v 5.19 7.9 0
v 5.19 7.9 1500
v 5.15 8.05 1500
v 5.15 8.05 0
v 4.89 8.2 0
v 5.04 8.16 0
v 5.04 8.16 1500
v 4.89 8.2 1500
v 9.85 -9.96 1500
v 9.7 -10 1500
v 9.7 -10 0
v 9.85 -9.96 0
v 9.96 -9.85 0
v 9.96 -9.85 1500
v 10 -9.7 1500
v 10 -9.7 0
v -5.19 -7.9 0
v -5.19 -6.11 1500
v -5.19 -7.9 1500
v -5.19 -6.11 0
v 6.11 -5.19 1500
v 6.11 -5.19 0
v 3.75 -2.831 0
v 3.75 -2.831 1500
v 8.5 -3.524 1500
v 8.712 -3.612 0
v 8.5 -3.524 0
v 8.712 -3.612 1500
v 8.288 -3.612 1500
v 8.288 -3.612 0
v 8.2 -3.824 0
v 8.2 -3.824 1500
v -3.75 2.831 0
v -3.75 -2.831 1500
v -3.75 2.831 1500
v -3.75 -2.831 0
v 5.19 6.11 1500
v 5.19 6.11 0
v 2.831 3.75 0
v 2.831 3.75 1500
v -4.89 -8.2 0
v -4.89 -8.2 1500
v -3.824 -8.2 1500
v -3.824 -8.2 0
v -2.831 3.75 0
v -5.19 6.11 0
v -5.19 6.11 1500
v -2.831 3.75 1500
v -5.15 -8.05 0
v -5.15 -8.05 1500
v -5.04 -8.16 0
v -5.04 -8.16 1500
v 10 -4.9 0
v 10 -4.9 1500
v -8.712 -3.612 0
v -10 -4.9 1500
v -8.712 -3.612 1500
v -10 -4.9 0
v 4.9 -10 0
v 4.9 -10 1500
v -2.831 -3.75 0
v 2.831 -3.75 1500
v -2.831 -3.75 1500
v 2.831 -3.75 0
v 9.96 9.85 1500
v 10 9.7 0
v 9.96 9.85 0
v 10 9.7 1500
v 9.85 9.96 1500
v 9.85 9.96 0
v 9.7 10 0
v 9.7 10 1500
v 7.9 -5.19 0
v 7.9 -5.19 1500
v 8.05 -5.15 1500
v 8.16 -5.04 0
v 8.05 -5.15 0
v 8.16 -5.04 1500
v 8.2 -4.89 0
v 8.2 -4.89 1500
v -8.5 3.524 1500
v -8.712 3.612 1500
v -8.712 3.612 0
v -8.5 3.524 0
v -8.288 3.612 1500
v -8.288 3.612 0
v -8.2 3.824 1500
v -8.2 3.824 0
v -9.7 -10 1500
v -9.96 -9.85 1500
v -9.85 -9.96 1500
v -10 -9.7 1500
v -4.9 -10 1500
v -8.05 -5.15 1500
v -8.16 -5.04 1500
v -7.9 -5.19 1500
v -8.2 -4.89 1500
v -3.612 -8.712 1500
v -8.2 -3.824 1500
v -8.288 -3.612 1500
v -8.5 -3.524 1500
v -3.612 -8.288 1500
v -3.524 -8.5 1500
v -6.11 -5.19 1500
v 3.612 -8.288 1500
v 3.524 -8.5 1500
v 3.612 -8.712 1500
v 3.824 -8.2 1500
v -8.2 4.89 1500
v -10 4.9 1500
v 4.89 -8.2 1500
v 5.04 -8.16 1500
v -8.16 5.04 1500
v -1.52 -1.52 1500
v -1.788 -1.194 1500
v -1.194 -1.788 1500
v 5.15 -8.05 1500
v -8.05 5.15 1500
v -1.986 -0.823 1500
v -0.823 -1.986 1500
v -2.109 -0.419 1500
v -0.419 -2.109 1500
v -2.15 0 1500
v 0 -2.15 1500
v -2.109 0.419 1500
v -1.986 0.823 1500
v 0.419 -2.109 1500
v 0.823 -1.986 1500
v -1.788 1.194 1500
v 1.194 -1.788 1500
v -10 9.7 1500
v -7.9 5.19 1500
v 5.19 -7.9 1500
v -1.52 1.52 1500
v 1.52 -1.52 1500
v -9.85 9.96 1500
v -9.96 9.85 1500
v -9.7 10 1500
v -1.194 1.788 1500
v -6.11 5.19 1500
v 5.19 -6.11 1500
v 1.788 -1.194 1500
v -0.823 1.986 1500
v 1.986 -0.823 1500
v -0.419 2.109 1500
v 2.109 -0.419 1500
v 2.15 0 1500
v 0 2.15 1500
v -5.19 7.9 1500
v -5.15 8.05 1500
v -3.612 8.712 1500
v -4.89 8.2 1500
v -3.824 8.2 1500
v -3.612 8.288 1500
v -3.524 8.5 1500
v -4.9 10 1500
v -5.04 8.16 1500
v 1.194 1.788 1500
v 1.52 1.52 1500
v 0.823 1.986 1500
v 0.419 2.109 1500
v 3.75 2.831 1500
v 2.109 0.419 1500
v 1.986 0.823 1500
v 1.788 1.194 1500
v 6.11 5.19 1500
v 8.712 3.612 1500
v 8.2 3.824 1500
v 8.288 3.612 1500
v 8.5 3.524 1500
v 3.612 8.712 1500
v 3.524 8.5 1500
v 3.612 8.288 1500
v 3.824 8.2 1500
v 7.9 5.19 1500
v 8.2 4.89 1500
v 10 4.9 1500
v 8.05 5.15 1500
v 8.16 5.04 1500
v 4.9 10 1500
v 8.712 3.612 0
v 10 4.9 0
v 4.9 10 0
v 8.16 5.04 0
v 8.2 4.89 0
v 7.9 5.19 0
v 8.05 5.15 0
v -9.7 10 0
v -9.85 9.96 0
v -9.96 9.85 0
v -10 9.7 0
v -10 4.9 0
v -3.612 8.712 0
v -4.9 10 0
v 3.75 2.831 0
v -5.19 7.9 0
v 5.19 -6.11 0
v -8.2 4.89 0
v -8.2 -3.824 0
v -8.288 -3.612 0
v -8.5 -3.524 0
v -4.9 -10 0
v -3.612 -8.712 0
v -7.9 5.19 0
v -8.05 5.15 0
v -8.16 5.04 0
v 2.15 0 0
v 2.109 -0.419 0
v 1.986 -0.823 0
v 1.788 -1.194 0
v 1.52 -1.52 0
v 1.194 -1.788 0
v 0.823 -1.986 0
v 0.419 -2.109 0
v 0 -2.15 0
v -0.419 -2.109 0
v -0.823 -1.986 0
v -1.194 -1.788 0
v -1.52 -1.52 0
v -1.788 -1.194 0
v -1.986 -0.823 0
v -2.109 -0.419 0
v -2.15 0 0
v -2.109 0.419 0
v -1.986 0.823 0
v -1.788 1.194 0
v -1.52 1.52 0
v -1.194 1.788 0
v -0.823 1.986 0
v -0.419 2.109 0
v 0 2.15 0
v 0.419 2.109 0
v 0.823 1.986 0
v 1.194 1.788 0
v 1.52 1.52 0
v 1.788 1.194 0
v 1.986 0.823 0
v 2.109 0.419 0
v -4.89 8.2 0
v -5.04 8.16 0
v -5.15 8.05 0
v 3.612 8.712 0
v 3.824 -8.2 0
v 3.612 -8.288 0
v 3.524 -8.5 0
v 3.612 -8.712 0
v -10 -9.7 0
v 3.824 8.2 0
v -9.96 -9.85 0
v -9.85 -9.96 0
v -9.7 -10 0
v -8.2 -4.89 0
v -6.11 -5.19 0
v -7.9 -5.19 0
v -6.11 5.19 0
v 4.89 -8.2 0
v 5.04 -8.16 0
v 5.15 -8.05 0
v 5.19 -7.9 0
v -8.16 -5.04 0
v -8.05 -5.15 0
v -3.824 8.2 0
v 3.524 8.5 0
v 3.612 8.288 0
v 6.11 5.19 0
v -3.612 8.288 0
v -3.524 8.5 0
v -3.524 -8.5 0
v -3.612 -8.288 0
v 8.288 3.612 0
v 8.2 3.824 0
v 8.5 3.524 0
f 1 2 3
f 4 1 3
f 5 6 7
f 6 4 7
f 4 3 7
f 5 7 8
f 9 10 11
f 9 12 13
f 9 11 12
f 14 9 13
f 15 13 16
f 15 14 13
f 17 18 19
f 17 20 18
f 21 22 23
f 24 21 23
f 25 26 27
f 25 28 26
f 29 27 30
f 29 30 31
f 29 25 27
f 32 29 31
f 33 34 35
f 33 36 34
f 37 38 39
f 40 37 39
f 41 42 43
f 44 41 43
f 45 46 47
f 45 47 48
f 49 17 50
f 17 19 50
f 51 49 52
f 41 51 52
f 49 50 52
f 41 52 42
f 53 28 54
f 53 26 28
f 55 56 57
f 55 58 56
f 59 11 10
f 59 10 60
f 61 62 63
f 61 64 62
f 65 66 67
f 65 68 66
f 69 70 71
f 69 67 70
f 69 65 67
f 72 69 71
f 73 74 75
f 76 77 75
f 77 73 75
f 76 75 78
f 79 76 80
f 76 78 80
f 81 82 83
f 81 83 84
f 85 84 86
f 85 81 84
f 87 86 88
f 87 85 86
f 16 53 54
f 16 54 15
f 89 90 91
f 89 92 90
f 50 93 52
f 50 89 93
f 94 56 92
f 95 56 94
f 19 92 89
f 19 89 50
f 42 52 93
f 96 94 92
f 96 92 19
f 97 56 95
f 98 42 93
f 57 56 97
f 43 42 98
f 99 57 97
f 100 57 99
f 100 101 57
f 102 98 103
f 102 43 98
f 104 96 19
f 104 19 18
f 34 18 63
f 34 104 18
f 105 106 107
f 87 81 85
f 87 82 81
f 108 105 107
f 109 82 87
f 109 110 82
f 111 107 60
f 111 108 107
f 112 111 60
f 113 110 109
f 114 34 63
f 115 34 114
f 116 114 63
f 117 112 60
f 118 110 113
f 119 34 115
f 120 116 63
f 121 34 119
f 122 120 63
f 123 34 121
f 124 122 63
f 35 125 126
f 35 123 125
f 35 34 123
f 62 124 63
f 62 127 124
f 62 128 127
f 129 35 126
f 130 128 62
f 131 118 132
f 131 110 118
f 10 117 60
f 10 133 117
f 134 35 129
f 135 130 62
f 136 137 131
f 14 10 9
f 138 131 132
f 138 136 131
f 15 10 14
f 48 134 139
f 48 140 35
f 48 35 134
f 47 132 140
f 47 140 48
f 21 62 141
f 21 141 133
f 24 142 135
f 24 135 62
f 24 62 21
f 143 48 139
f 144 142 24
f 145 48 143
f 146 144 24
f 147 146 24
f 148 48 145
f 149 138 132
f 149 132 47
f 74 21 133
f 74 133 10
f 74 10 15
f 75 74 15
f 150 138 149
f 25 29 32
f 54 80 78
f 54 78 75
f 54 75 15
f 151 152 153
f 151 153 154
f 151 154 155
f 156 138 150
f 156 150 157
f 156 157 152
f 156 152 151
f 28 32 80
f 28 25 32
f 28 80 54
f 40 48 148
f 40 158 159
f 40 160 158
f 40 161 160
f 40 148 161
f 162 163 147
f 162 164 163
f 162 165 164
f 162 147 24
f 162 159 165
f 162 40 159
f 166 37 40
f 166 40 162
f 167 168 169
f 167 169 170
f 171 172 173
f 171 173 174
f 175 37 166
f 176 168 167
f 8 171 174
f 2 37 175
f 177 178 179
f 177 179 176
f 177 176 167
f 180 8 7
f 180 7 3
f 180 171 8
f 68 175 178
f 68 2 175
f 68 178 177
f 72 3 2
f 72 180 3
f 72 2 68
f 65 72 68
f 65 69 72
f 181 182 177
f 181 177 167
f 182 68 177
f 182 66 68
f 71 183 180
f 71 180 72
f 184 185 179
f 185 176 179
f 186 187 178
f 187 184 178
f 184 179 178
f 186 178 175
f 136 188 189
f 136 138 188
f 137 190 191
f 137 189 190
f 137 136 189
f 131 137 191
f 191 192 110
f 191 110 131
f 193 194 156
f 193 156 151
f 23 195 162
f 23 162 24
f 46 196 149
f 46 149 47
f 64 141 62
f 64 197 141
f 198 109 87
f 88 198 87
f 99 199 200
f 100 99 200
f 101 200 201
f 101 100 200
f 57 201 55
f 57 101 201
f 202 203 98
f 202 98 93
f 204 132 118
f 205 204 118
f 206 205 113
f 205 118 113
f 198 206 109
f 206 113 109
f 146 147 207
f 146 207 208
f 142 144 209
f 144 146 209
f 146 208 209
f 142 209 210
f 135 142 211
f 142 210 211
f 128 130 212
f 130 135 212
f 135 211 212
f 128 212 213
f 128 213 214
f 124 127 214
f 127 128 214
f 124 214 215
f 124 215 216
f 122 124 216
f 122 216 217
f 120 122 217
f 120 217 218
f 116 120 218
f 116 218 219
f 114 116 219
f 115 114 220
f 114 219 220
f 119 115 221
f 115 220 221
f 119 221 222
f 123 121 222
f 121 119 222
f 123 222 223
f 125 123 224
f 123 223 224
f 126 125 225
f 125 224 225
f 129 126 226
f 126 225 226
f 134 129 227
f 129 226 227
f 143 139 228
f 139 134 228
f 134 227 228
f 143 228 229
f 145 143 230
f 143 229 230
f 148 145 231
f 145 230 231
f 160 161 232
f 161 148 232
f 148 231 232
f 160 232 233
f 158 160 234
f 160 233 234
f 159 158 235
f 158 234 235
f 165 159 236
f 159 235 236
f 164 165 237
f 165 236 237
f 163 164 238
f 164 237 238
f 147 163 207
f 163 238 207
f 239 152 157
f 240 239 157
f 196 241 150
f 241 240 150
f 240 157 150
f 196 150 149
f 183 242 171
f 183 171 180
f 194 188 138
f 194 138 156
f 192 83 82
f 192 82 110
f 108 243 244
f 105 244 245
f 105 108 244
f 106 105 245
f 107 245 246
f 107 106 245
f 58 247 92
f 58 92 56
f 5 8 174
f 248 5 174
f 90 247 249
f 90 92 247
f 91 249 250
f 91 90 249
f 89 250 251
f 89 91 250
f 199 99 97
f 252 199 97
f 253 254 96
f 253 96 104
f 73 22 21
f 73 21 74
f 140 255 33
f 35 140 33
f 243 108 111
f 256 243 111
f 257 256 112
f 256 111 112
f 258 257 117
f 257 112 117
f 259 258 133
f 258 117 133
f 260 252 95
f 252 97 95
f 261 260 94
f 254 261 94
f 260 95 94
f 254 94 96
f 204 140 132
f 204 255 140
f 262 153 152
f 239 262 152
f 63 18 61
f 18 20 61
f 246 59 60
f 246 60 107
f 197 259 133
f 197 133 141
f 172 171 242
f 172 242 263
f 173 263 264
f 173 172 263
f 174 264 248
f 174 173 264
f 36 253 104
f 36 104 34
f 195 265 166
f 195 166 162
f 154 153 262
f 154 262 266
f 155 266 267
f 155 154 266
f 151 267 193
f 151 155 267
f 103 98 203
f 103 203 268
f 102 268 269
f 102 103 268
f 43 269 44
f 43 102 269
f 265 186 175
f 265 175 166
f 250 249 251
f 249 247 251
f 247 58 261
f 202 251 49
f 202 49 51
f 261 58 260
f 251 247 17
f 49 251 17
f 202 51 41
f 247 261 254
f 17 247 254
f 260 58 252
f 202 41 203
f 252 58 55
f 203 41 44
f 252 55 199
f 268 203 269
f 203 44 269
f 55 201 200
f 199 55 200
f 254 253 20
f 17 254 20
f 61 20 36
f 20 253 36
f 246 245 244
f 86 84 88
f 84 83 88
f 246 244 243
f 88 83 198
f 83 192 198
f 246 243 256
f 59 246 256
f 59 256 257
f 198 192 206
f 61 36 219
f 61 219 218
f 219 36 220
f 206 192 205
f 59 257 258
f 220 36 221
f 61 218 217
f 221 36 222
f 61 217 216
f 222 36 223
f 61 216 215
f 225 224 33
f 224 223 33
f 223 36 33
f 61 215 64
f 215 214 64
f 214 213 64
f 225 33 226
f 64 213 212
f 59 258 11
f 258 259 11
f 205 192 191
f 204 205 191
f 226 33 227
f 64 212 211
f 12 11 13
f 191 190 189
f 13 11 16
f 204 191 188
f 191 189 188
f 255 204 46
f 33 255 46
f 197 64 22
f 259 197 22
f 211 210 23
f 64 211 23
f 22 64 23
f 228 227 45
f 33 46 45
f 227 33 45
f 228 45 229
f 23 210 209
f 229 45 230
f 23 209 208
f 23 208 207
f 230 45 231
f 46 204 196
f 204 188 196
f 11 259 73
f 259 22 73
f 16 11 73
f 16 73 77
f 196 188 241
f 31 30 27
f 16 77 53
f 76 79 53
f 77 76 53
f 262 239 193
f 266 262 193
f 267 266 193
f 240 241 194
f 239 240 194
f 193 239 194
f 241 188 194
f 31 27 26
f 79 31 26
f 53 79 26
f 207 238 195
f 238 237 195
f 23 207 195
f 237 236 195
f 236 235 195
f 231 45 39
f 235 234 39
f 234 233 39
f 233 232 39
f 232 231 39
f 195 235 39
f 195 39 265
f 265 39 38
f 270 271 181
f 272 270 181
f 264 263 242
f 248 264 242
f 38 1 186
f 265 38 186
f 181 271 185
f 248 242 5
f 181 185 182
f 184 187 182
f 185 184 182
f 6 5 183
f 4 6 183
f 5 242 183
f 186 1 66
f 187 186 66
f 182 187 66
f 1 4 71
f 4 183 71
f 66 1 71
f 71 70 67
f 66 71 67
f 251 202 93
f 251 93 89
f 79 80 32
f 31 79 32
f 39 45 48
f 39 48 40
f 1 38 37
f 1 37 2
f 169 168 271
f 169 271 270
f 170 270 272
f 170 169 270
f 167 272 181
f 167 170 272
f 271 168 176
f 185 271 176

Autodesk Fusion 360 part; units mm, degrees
sketch "Sketch1" plane through (0, 0, 0) normal (0, 0, 1) x (1, 0, 0)
  circle A0 centre (0, 0) radius 2.15
  line L0 (3.75, 2.8308) -> (3.75, -2.8308)
  line L1 (8.2, -3.1) -> (10, -4.9)
  line L2 (10, -4.9) -> (10, -10)
  line L3 (-2.8308, 3.75) -> (2.8308, 3.75)
  line L4 (-3.75, -2.8308) -> (-3.75, 2.8308)
  line L5 (2.8308, -3.75) -> (-2.8308, -3.75)
  line L6 (6.1096, -5.1904) -> (8.2, -5.1904)
  line L7 (8.2, -5.1904) -> (8.2, -3.1)
  line L8 (6.1096, -5.1904) -> (3.75, -2.8308)
  line L9 (10, -10) -> (4.9, -10)
  line L10 (4.9, -10) -> (3.1, -8.2)
  line L11 (3.1, -8.2) -> (5.1904, -8.2)
  line L12 (5.1904, -8.2) -> (5.1904, -6.1096)
  line L13 (5.1904, -6.1096) -> (2.8308, -3.75)
  line L14 (8.2, 3.1) -> (8.2, 5.1904)
  line L15 (10, 10) -> (10, 4.9)
  line L16 (8.2, 5.1904) -> (6.1096, 5.1904)
  line L17 (5.1904, 8.2) -> (3.1, 8.2)
  line L18 (6.1096, 5.1904) -> (3.75, 2.8308)
  line L19 (5.1904, 6.1096) -> (5.1904, 8.2)
  line L20 (4.9, 10) -> (10, 10)
  line L21 (10, 4.9) -> (8.2, 3.1)
  line L22 (5.1904, 6.1096) -> (2.8308, 3.75)
  line L23 (3.1, 8.2) -> (4.9, 10)
  line L24 (-3.1, 8.2) -> (-5.1904, 8.2)
  line L25 (-10, 10) -> (-4.9, 10)
  line L26 (-5.1904, 8.2) -> (-5.1904, 6.1096)
  line L27 (-8.2, 5.1904) -> (-8.2, 3.1)
  line L28 (-5.1904, 6.1096) -> (-2.8308, 3.75)
  line L29 (-6.1096, 5.1904) -> (-8.2, 5.1904)
  line L30 (-10, 4.9) -> (-10, 10)
  line L31 (-4.9, 10) -> (-3.1, 8.2)
  line L32 (-6.1096, 5.1904) -> (-3.75, 2.8308)
  line L33 (-8.2, 3.1) -> (-10, 4.9)
  line L34 (-8.2, -3.1) -> (-8.2, -5.1904)
  line L35 (-10, -10) -> (-10, -4.9)
  line L36 (-8.2, -5.1904) -> (-6.1096, -5.1904)
  line L37 (-5.1904, -8.2) -> (-3.1, -8.2)
  line L38 (-6.1096, -5.1904) -> (-3.75, -2.8308)
  line L39 (-5.1904, -6.1096) -> (-5.1904, -8.2)
  line L40 (-4.9, -10) -> (-10, -10)
  line L41 (-10, -4.9) -> (-8.2, -3.1)
  line L42 (-5.1904, -6.1096) -> (-2.8308, -3.75)
  line L43 (-3.1, -8.2) -> (-4.9, -10)
  dimension "d24" = 4.3
  dimension "d39" = 360
  dimension "d45" = 360
extrude "Extrude1" add sketch "Sketch1" along normal blind 1500
fillet "Fillet1" radius 0.3 4 edges at (-10, -10, 750) (-10, 10, 750) (10, -10, 750) (10, 10, 750)
fillet "Fillet2" radius 0.3 8 edges at (3.1, 8.2, 750) (-3.1, 8.2, 750) (-8.2, -3.1, 750) (3.1, -8.2, 750) (8.2, -3.1, 750) (-3.1, -8.2, 750) (8.2, 3.1, 750) (-8.2, 3.1, 750)
fillet "Fillet3" radius 0.3 8 edges at (8.2, 5.1904, 750) (5.1904, 8.2, 750) (8.2, -5.1904, 750) (5.1904, -8.2, 750) (-5.1904, -8.2, 750) (-8.2, -5.1904, 750) (-8.2, 5.1904, 750) (-5.1904, 8.2, 750)
